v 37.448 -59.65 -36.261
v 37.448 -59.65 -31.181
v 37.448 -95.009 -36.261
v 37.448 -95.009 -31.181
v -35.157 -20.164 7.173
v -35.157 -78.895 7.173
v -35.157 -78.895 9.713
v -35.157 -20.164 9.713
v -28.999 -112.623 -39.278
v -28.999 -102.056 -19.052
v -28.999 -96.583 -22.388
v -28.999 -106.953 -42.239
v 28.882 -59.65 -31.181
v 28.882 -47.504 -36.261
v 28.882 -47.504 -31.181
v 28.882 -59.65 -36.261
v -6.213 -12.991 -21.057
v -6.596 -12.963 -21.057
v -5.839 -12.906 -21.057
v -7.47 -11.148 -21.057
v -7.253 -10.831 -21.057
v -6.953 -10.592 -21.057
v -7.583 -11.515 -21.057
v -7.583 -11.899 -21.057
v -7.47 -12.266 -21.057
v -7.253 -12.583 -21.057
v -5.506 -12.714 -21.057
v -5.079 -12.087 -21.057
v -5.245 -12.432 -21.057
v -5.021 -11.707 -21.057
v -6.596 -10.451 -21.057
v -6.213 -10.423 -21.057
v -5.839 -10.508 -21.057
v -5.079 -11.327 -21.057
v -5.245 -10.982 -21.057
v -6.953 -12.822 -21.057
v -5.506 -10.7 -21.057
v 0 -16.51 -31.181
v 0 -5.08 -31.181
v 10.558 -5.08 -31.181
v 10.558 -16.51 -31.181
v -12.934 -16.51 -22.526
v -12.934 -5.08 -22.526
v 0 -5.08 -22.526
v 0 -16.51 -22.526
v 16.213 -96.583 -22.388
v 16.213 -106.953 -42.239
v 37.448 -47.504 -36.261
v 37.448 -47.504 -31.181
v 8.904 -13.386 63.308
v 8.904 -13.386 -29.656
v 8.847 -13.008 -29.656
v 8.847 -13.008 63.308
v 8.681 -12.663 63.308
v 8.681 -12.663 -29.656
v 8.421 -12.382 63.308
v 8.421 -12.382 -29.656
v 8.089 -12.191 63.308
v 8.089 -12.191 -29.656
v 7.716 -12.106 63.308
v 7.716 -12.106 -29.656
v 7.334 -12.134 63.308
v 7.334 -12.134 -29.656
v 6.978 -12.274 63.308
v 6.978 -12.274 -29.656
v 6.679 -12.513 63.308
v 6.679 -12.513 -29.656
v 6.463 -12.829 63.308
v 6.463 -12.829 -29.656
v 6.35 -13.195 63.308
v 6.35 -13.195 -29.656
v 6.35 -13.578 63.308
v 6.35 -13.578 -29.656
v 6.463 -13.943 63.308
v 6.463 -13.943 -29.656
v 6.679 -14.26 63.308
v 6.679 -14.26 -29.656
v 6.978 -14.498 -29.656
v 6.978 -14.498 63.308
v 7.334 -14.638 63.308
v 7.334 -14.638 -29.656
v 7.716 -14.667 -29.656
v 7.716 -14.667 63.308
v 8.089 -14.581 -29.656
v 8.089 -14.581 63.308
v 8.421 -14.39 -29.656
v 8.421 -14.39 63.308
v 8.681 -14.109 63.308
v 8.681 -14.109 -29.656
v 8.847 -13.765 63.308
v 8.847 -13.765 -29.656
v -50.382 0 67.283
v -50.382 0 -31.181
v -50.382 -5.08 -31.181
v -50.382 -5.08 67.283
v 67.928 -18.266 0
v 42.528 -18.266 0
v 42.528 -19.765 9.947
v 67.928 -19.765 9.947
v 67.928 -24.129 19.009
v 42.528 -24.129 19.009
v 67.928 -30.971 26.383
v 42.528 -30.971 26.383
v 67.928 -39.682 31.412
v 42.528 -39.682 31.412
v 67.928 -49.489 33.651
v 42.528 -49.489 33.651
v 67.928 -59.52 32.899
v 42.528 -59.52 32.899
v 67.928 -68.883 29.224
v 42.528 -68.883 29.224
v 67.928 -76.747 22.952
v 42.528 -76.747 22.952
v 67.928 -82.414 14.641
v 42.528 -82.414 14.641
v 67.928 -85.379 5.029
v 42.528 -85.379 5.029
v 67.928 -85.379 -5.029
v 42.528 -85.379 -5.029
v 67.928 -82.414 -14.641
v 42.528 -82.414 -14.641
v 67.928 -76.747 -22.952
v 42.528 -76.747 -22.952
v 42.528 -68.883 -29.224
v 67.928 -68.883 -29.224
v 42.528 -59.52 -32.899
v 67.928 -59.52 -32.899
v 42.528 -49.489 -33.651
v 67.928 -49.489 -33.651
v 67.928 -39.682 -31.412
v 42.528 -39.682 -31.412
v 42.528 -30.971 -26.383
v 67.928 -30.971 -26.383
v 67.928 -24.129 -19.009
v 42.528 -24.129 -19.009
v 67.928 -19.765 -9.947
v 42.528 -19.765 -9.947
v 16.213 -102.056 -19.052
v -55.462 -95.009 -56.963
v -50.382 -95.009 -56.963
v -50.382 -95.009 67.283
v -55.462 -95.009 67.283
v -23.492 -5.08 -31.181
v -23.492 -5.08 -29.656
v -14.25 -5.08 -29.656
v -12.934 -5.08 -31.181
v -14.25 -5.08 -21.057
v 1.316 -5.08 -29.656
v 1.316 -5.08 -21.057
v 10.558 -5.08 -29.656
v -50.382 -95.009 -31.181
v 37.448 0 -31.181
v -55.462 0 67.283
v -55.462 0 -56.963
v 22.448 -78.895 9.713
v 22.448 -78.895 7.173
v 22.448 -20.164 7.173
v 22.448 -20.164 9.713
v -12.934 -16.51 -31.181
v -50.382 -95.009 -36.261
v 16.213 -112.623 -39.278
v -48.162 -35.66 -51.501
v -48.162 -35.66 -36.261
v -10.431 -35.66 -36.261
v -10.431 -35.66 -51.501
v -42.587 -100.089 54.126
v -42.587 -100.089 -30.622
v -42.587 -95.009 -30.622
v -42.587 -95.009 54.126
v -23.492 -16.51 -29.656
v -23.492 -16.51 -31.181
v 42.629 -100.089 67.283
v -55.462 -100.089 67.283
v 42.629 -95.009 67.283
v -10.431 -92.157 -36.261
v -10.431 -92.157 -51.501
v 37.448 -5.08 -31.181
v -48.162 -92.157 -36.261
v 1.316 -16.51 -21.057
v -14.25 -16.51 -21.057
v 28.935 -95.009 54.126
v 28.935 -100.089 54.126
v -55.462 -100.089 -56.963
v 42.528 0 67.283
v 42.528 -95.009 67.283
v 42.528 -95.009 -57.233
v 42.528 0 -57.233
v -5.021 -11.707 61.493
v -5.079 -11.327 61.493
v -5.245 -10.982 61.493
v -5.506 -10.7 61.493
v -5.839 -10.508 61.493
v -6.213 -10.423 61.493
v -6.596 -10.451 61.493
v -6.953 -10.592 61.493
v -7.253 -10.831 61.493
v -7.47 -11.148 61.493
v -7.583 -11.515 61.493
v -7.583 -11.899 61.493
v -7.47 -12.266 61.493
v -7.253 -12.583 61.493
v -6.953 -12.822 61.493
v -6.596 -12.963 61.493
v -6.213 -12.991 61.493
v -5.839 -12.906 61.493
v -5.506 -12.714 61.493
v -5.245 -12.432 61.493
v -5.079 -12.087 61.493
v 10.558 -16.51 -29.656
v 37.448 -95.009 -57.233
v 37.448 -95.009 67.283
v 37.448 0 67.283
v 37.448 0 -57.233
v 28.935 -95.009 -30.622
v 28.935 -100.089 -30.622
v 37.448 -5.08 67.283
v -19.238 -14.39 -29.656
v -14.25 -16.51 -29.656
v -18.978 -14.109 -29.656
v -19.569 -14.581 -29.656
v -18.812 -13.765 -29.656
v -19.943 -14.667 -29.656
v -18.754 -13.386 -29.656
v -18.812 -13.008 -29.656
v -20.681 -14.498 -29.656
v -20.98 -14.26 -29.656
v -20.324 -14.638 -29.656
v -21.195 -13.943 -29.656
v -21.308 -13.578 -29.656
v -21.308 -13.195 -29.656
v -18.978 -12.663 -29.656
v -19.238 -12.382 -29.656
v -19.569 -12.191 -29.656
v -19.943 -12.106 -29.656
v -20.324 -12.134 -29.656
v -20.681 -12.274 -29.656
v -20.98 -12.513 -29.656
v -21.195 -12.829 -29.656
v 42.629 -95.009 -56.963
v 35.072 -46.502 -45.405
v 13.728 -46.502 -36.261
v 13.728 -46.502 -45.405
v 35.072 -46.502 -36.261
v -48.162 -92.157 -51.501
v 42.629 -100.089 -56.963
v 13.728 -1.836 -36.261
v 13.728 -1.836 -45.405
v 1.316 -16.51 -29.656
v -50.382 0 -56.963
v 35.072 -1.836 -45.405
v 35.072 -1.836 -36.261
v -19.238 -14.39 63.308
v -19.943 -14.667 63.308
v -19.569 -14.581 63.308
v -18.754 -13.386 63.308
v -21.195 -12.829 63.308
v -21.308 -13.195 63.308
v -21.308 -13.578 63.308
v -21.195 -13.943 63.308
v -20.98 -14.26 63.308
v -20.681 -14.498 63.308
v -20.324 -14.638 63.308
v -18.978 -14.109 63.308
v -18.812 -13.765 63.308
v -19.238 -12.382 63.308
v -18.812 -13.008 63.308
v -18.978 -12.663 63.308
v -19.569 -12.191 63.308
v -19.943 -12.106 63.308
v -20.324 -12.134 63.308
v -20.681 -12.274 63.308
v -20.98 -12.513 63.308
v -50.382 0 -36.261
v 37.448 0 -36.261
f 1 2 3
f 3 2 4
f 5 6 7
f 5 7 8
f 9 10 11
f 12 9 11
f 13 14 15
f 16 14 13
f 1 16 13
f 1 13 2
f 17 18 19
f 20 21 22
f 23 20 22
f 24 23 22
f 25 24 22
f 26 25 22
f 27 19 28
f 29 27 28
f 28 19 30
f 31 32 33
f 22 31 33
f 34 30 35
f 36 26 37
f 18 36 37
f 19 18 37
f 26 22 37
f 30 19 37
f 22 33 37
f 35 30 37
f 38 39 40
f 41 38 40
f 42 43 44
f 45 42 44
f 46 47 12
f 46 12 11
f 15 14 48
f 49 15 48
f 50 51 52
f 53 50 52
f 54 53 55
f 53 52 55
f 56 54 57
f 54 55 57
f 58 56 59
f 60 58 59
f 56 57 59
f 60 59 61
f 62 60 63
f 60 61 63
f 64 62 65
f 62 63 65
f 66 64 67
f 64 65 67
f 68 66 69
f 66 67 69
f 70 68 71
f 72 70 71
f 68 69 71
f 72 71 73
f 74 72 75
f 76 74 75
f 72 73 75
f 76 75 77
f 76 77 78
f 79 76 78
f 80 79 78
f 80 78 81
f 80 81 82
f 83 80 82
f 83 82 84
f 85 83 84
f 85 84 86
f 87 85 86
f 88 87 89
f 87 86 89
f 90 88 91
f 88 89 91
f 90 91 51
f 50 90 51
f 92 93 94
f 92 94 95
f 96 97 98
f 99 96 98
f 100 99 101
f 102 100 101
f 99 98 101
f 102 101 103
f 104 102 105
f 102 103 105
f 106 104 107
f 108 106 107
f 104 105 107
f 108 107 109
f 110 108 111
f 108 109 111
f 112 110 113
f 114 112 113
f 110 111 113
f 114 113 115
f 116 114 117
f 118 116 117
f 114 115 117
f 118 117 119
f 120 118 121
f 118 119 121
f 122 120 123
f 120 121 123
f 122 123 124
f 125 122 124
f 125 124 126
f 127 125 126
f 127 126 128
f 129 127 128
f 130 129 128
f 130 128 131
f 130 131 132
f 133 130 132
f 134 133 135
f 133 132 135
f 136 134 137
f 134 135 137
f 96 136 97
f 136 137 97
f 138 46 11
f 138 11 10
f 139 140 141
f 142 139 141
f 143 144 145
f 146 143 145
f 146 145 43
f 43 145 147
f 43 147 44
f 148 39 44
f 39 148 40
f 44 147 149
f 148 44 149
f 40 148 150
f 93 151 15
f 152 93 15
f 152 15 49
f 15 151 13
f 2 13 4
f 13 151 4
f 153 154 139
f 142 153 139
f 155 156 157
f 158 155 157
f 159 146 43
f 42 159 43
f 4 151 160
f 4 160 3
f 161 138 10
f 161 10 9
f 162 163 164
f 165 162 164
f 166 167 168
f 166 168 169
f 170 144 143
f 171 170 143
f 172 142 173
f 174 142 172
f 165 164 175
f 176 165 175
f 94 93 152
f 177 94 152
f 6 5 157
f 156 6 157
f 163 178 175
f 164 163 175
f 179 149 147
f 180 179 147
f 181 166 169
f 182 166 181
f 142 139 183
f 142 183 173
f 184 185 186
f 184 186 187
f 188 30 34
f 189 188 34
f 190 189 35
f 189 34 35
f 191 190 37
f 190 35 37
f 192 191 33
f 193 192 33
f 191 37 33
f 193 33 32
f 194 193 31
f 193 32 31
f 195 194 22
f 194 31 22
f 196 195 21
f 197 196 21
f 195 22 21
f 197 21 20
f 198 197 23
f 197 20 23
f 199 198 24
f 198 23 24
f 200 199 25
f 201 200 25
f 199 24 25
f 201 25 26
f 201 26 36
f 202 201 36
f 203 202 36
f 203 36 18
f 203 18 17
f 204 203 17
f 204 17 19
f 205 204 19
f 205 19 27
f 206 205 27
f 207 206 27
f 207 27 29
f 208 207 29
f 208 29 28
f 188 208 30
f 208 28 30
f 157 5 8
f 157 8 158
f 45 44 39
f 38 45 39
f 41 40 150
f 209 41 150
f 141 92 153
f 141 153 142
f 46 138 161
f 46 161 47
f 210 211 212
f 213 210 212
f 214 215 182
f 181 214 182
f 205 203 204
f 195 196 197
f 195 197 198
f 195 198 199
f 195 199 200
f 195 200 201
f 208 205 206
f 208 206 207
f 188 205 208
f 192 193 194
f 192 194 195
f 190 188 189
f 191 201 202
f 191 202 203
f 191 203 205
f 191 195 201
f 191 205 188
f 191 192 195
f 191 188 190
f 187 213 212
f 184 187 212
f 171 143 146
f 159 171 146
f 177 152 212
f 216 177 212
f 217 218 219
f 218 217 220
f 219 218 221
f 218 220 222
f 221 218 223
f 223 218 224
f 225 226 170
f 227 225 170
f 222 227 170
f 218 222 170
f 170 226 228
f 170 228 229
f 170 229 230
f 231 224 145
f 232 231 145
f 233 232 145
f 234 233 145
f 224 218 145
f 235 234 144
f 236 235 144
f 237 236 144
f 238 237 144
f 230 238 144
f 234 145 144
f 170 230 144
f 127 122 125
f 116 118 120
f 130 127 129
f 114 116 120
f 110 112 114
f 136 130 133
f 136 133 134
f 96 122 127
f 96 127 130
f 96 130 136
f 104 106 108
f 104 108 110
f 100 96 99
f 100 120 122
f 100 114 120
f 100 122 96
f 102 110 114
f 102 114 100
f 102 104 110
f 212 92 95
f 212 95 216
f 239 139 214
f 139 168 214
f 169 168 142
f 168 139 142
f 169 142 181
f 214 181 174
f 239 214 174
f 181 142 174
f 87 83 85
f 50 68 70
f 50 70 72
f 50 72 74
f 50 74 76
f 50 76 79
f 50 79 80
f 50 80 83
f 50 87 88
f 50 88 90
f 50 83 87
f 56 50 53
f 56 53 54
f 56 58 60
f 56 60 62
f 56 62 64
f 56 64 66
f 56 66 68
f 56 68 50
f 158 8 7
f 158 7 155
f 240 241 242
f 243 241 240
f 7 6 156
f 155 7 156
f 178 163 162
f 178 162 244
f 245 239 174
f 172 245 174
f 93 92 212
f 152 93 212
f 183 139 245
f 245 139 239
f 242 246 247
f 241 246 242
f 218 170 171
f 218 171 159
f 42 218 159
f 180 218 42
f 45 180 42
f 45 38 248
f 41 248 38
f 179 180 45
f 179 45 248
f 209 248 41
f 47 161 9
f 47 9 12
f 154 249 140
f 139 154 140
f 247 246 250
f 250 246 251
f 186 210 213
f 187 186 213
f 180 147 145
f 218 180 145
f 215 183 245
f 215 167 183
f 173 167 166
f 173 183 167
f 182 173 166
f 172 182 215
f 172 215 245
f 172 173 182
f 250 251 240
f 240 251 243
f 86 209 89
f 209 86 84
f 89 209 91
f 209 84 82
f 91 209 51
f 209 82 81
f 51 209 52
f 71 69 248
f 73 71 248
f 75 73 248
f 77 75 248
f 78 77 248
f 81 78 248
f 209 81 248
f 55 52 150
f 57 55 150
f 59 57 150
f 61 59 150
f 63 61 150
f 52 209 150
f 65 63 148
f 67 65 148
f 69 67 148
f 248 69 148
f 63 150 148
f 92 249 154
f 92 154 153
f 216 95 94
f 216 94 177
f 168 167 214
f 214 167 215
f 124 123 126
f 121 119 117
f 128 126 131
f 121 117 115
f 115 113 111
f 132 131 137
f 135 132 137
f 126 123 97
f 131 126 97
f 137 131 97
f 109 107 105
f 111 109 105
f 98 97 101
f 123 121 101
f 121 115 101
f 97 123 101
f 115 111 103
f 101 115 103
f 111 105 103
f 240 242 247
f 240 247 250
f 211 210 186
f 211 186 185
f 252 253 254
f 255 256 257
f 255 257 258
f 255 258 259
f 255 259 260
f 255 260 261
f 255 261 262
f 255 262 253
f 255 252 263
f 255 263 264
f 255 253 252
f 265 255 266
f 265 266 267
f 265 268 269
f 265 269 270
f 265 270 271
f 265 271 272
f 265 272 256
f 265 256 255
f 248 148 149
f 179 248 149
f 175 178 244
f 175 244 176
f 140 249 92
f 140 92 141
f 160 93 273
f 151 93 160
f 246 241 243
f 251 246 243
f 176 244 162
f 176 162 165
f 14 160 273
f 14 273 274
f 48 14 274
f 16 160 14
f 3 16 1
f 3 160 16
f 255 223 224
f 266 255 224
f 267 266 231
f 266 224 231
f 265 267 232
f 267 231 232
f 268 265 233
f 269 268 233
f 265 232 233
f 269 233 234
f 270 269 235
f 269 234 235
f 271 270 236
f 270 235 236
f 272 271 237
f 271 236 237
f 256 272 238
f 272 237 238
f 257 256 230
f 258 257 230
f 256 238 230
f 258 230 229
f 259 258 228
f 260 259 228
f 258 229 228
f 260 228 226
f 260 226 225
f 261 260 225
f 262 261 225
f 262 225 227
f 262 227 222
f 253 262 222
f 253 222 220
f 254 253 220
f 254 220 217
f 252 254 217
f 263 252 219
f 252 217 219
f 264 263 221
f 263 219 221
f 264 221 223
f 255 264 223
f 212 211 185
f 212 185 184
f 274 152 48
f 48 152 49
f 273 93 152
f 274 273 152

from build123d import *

# Parameters (mm, degrees)
F0_W      = 87.8305286169
F0_H      = 98.46470505
F1_DEPTH  = 5.08
F2_W      = 87.8305286169
F2_H      = 95.0086340308
F3_DEPTH  = 5.08
F4_W      = 95.0086340308
F4_H      = 124.5161257684
F5_DEPTH  = 5.08
F6_W      = 95.0086340308
F6_H      = 124.246340245
F7_DEPTH  = 5.08
F8_W      = 98.0914154202
F8_H      = 124.246340245
F9_DEPTH  = 5.08
F10_W     = 71.5218801051
F10_H     = 84.7484581172
F11_DEPTH = 25.4
F13_DEPTH = 11.43
F15_R     = 1.2840313407
F16_DEPTH = 92.964
F14_R     = 1.287825451
F17_DEPTH = 82.55
F18_W     = 37.7307755407
F18_H     = 56.4974024892
F19_DEPTH = 15.24
F20_W     = 21.343825385
F20_H     = 44.6666606003
F21_DEPTH = 9.144
F22_W     = 8.5665397346
F22_H     = 12.1454820037
F23_DEPTH = 25.4
F25_W     = 57.6052330434
F25_H     = 58.7303321809
F26_DEPTH = 2.54
F29_DEPTH = 45.212
F30_R     = 33.7449831522
F31_DEPTH = 25.4


with BuildPart() as f1:
    # F0 (on Front) → F1 (new body)
    with BuildSketch(Plane.XZ):
        with Locations((-6.466973573, 18.0510021746)):
            Rectangle(F0_W, F0_H)
    extrude(amount=F1_DEPTH)


with BuildPart() as f3:
    # F2 (on face) → F3 (new body)
    with BuildSketch(Plane(origin=(0, 0, -31.1813503504), x_dir=(1, 0, 0), z_dir=(0, 0, -1))):
        with Locations((-6.466973573, 47.5043170154)):
            Rectangle(F2_W, F2_H)
    extrude(amount=F3_DEPTH)

    # F22 (on face) → F23 (cut)
    with BuildSketch(Plane(origin=(0, 0, -36.2613503504), x_dir=(1, 0, 0), z_dir=(0, 0, -1))):
        with Locations((33.1650208682, 53.5770580173)):
            Rectangle(F22_W, F22_H)
    extrude(amount=-F23_DEPTH, mode=Mode.SUBTRACT)


with BuildPart() as f5:
    # F4 (on face) → F5 (new body)
    with BuildSketch(Plane.YZ.offset(37.4482907355)):
        with Locations((-47.5043170154, 5.0252918154)):
            Rectangle(F4_W, F4_H)
    extrude(amount=F5_DEPTH)


with BuildPart() as f7:
    # F6 (on face) → F7 (new body)
    with BuildSketch(Plane(origin=(-50.3822378814, 0, 0), x_dir=(0, -1, 0), z_dir=(-1, 0, 0))):
        with Locations((47.5043170154, 5.1601845771)):
            Rectangle(F6_W, F6_H)
    extrude(amount=F7_DEPTH)


with BuildPart() as f9:
    # F8 (on face) → F9 (new body)
    with BuildSketch(Plane.XZ.offset(95.0086340308)):
        with Locations((-6.4165301713, 5.1601845771)):
            Rectangle(F8_W, F8_H)
    extrude(amount=F9_DEPTH)

    # F10 (on face) → F11 (cut)
    with BuildSketch(Plane.XZ.offset(100.0886340308)):
        with Locations((-6.8259714171, 11.7521714419)):
            Rectangle(F10_W, F10_H)
    extrude(amount=-F11_DEPTH, mode=Mode.SUBTRACT)


with BuildPart() as f13:
    # F12 (on face) → F13 (new body)
    with BuildSketch(Plane.XZ.offset(5.08)):
        Polygon((-12.9339471459, -22.5257072598), (-6.466973573, -22.5257072598), (0, -22.5257072598), (0, -31.1813503504), (10.5579076335, -31.1813503504), (10.5579076335, -29.6559333801), (1.3164286502, -29.6559333801), (1.3164286502, -21.0573486984), (-6.466973573, -21.0573486984), (-14.2503757961, -21.0573486984), (-14.2503757961, -29.6559333801), (-23.4918547794, -29.6559333801), (-23.4918547794, -31.1813503504), (-12.9339471459, -31.1813503504), align=None)
    extrude(amount=F13_DEPTH)

    # F15 (on face) → F16 (join)
    with BuildSketch(Plane.XY.offset(-29.6559333801)):
        with Locations((-20.0384948403, -13.3861526847)):
            Circle(F15_R)
        with Locations((7.6200012118, -13.3861526847)):
            Circle(F15_R)
    extrude(amount=F16_DEPTH)


with BuildPart() as f17:
    # F14 (on face) → F17 (new body)
    with BuildSketch(Plane.XY.offset(-21.0573486984)):
        with Locations((-6.3092312776, -11.7070348933)):
            Circle(F14_R)
    extrude(amount=F17_DEPTH)


with BuildPart() as f19:
    # F18 (on face) → F19 (new body)
    with BuildSketch(Plane(origin=(0, 0, -36.2613503504), x_dir=(1, 0, 0), z_dir=(0, 0, -1))):
        with Locations((-29.2961454252, 63.908342272)):
            Rectangle(F18_W, F18_H)
    extrude(amount=F19_DEPTH)


with BuildPart() as f21:
    # F20 (on face) → F21 (new body)
    with BuildSketch(Plane(origin=(0, 0, -36.2613503504), x_dir=(1, 0, 0), z_dir=(0, 0, -1))):
        with Locations((24.4000153616, 24.1690996918)):
            Rectangle(F20_W, F20_H)
    extrude(amount=F21_DEPTH)


with BuildPart() as f26:
    # F25 (on offset) → F26 (new body)
    with BuildSketch(Plane.XY.offset(7.1726496496)):
        with Locations((-6.354464218, -49.529501237)):
            Rectangle(F25_W, F25_H)
    extrude(amount=F26_DEPTH)


with BuildPart() as f29:
    # F28 (on offset) → F29 (new body)
    with BuildSketch(Plane.YZ.offset(16.2131775388)):
        Polygon((-106.9532558322, -42.2394126654), (-96.5828751117, -22.3881331654), (-102.0563237106, -19.0516483007), (-112.6225219896, -39.277767374), align=None)
    extrude(amount=-F29_DEPTH)


with BuildPart() as f31:
    # F30 (on face) → F31 (new body)
    with BuildSketch(Plane.YZ.offset(42.5282907355)):
        with Locations((-52.0105399191, 0)):
            Circle(F30_R)
    extrude(amount=F31_DEPTH)


solid = Compound([f1.part, f3.part, f5.part, f7.part, f9.part, f13.part, f17.part, f19.part, f21.part, f26.part, f29.part, f31.part])
